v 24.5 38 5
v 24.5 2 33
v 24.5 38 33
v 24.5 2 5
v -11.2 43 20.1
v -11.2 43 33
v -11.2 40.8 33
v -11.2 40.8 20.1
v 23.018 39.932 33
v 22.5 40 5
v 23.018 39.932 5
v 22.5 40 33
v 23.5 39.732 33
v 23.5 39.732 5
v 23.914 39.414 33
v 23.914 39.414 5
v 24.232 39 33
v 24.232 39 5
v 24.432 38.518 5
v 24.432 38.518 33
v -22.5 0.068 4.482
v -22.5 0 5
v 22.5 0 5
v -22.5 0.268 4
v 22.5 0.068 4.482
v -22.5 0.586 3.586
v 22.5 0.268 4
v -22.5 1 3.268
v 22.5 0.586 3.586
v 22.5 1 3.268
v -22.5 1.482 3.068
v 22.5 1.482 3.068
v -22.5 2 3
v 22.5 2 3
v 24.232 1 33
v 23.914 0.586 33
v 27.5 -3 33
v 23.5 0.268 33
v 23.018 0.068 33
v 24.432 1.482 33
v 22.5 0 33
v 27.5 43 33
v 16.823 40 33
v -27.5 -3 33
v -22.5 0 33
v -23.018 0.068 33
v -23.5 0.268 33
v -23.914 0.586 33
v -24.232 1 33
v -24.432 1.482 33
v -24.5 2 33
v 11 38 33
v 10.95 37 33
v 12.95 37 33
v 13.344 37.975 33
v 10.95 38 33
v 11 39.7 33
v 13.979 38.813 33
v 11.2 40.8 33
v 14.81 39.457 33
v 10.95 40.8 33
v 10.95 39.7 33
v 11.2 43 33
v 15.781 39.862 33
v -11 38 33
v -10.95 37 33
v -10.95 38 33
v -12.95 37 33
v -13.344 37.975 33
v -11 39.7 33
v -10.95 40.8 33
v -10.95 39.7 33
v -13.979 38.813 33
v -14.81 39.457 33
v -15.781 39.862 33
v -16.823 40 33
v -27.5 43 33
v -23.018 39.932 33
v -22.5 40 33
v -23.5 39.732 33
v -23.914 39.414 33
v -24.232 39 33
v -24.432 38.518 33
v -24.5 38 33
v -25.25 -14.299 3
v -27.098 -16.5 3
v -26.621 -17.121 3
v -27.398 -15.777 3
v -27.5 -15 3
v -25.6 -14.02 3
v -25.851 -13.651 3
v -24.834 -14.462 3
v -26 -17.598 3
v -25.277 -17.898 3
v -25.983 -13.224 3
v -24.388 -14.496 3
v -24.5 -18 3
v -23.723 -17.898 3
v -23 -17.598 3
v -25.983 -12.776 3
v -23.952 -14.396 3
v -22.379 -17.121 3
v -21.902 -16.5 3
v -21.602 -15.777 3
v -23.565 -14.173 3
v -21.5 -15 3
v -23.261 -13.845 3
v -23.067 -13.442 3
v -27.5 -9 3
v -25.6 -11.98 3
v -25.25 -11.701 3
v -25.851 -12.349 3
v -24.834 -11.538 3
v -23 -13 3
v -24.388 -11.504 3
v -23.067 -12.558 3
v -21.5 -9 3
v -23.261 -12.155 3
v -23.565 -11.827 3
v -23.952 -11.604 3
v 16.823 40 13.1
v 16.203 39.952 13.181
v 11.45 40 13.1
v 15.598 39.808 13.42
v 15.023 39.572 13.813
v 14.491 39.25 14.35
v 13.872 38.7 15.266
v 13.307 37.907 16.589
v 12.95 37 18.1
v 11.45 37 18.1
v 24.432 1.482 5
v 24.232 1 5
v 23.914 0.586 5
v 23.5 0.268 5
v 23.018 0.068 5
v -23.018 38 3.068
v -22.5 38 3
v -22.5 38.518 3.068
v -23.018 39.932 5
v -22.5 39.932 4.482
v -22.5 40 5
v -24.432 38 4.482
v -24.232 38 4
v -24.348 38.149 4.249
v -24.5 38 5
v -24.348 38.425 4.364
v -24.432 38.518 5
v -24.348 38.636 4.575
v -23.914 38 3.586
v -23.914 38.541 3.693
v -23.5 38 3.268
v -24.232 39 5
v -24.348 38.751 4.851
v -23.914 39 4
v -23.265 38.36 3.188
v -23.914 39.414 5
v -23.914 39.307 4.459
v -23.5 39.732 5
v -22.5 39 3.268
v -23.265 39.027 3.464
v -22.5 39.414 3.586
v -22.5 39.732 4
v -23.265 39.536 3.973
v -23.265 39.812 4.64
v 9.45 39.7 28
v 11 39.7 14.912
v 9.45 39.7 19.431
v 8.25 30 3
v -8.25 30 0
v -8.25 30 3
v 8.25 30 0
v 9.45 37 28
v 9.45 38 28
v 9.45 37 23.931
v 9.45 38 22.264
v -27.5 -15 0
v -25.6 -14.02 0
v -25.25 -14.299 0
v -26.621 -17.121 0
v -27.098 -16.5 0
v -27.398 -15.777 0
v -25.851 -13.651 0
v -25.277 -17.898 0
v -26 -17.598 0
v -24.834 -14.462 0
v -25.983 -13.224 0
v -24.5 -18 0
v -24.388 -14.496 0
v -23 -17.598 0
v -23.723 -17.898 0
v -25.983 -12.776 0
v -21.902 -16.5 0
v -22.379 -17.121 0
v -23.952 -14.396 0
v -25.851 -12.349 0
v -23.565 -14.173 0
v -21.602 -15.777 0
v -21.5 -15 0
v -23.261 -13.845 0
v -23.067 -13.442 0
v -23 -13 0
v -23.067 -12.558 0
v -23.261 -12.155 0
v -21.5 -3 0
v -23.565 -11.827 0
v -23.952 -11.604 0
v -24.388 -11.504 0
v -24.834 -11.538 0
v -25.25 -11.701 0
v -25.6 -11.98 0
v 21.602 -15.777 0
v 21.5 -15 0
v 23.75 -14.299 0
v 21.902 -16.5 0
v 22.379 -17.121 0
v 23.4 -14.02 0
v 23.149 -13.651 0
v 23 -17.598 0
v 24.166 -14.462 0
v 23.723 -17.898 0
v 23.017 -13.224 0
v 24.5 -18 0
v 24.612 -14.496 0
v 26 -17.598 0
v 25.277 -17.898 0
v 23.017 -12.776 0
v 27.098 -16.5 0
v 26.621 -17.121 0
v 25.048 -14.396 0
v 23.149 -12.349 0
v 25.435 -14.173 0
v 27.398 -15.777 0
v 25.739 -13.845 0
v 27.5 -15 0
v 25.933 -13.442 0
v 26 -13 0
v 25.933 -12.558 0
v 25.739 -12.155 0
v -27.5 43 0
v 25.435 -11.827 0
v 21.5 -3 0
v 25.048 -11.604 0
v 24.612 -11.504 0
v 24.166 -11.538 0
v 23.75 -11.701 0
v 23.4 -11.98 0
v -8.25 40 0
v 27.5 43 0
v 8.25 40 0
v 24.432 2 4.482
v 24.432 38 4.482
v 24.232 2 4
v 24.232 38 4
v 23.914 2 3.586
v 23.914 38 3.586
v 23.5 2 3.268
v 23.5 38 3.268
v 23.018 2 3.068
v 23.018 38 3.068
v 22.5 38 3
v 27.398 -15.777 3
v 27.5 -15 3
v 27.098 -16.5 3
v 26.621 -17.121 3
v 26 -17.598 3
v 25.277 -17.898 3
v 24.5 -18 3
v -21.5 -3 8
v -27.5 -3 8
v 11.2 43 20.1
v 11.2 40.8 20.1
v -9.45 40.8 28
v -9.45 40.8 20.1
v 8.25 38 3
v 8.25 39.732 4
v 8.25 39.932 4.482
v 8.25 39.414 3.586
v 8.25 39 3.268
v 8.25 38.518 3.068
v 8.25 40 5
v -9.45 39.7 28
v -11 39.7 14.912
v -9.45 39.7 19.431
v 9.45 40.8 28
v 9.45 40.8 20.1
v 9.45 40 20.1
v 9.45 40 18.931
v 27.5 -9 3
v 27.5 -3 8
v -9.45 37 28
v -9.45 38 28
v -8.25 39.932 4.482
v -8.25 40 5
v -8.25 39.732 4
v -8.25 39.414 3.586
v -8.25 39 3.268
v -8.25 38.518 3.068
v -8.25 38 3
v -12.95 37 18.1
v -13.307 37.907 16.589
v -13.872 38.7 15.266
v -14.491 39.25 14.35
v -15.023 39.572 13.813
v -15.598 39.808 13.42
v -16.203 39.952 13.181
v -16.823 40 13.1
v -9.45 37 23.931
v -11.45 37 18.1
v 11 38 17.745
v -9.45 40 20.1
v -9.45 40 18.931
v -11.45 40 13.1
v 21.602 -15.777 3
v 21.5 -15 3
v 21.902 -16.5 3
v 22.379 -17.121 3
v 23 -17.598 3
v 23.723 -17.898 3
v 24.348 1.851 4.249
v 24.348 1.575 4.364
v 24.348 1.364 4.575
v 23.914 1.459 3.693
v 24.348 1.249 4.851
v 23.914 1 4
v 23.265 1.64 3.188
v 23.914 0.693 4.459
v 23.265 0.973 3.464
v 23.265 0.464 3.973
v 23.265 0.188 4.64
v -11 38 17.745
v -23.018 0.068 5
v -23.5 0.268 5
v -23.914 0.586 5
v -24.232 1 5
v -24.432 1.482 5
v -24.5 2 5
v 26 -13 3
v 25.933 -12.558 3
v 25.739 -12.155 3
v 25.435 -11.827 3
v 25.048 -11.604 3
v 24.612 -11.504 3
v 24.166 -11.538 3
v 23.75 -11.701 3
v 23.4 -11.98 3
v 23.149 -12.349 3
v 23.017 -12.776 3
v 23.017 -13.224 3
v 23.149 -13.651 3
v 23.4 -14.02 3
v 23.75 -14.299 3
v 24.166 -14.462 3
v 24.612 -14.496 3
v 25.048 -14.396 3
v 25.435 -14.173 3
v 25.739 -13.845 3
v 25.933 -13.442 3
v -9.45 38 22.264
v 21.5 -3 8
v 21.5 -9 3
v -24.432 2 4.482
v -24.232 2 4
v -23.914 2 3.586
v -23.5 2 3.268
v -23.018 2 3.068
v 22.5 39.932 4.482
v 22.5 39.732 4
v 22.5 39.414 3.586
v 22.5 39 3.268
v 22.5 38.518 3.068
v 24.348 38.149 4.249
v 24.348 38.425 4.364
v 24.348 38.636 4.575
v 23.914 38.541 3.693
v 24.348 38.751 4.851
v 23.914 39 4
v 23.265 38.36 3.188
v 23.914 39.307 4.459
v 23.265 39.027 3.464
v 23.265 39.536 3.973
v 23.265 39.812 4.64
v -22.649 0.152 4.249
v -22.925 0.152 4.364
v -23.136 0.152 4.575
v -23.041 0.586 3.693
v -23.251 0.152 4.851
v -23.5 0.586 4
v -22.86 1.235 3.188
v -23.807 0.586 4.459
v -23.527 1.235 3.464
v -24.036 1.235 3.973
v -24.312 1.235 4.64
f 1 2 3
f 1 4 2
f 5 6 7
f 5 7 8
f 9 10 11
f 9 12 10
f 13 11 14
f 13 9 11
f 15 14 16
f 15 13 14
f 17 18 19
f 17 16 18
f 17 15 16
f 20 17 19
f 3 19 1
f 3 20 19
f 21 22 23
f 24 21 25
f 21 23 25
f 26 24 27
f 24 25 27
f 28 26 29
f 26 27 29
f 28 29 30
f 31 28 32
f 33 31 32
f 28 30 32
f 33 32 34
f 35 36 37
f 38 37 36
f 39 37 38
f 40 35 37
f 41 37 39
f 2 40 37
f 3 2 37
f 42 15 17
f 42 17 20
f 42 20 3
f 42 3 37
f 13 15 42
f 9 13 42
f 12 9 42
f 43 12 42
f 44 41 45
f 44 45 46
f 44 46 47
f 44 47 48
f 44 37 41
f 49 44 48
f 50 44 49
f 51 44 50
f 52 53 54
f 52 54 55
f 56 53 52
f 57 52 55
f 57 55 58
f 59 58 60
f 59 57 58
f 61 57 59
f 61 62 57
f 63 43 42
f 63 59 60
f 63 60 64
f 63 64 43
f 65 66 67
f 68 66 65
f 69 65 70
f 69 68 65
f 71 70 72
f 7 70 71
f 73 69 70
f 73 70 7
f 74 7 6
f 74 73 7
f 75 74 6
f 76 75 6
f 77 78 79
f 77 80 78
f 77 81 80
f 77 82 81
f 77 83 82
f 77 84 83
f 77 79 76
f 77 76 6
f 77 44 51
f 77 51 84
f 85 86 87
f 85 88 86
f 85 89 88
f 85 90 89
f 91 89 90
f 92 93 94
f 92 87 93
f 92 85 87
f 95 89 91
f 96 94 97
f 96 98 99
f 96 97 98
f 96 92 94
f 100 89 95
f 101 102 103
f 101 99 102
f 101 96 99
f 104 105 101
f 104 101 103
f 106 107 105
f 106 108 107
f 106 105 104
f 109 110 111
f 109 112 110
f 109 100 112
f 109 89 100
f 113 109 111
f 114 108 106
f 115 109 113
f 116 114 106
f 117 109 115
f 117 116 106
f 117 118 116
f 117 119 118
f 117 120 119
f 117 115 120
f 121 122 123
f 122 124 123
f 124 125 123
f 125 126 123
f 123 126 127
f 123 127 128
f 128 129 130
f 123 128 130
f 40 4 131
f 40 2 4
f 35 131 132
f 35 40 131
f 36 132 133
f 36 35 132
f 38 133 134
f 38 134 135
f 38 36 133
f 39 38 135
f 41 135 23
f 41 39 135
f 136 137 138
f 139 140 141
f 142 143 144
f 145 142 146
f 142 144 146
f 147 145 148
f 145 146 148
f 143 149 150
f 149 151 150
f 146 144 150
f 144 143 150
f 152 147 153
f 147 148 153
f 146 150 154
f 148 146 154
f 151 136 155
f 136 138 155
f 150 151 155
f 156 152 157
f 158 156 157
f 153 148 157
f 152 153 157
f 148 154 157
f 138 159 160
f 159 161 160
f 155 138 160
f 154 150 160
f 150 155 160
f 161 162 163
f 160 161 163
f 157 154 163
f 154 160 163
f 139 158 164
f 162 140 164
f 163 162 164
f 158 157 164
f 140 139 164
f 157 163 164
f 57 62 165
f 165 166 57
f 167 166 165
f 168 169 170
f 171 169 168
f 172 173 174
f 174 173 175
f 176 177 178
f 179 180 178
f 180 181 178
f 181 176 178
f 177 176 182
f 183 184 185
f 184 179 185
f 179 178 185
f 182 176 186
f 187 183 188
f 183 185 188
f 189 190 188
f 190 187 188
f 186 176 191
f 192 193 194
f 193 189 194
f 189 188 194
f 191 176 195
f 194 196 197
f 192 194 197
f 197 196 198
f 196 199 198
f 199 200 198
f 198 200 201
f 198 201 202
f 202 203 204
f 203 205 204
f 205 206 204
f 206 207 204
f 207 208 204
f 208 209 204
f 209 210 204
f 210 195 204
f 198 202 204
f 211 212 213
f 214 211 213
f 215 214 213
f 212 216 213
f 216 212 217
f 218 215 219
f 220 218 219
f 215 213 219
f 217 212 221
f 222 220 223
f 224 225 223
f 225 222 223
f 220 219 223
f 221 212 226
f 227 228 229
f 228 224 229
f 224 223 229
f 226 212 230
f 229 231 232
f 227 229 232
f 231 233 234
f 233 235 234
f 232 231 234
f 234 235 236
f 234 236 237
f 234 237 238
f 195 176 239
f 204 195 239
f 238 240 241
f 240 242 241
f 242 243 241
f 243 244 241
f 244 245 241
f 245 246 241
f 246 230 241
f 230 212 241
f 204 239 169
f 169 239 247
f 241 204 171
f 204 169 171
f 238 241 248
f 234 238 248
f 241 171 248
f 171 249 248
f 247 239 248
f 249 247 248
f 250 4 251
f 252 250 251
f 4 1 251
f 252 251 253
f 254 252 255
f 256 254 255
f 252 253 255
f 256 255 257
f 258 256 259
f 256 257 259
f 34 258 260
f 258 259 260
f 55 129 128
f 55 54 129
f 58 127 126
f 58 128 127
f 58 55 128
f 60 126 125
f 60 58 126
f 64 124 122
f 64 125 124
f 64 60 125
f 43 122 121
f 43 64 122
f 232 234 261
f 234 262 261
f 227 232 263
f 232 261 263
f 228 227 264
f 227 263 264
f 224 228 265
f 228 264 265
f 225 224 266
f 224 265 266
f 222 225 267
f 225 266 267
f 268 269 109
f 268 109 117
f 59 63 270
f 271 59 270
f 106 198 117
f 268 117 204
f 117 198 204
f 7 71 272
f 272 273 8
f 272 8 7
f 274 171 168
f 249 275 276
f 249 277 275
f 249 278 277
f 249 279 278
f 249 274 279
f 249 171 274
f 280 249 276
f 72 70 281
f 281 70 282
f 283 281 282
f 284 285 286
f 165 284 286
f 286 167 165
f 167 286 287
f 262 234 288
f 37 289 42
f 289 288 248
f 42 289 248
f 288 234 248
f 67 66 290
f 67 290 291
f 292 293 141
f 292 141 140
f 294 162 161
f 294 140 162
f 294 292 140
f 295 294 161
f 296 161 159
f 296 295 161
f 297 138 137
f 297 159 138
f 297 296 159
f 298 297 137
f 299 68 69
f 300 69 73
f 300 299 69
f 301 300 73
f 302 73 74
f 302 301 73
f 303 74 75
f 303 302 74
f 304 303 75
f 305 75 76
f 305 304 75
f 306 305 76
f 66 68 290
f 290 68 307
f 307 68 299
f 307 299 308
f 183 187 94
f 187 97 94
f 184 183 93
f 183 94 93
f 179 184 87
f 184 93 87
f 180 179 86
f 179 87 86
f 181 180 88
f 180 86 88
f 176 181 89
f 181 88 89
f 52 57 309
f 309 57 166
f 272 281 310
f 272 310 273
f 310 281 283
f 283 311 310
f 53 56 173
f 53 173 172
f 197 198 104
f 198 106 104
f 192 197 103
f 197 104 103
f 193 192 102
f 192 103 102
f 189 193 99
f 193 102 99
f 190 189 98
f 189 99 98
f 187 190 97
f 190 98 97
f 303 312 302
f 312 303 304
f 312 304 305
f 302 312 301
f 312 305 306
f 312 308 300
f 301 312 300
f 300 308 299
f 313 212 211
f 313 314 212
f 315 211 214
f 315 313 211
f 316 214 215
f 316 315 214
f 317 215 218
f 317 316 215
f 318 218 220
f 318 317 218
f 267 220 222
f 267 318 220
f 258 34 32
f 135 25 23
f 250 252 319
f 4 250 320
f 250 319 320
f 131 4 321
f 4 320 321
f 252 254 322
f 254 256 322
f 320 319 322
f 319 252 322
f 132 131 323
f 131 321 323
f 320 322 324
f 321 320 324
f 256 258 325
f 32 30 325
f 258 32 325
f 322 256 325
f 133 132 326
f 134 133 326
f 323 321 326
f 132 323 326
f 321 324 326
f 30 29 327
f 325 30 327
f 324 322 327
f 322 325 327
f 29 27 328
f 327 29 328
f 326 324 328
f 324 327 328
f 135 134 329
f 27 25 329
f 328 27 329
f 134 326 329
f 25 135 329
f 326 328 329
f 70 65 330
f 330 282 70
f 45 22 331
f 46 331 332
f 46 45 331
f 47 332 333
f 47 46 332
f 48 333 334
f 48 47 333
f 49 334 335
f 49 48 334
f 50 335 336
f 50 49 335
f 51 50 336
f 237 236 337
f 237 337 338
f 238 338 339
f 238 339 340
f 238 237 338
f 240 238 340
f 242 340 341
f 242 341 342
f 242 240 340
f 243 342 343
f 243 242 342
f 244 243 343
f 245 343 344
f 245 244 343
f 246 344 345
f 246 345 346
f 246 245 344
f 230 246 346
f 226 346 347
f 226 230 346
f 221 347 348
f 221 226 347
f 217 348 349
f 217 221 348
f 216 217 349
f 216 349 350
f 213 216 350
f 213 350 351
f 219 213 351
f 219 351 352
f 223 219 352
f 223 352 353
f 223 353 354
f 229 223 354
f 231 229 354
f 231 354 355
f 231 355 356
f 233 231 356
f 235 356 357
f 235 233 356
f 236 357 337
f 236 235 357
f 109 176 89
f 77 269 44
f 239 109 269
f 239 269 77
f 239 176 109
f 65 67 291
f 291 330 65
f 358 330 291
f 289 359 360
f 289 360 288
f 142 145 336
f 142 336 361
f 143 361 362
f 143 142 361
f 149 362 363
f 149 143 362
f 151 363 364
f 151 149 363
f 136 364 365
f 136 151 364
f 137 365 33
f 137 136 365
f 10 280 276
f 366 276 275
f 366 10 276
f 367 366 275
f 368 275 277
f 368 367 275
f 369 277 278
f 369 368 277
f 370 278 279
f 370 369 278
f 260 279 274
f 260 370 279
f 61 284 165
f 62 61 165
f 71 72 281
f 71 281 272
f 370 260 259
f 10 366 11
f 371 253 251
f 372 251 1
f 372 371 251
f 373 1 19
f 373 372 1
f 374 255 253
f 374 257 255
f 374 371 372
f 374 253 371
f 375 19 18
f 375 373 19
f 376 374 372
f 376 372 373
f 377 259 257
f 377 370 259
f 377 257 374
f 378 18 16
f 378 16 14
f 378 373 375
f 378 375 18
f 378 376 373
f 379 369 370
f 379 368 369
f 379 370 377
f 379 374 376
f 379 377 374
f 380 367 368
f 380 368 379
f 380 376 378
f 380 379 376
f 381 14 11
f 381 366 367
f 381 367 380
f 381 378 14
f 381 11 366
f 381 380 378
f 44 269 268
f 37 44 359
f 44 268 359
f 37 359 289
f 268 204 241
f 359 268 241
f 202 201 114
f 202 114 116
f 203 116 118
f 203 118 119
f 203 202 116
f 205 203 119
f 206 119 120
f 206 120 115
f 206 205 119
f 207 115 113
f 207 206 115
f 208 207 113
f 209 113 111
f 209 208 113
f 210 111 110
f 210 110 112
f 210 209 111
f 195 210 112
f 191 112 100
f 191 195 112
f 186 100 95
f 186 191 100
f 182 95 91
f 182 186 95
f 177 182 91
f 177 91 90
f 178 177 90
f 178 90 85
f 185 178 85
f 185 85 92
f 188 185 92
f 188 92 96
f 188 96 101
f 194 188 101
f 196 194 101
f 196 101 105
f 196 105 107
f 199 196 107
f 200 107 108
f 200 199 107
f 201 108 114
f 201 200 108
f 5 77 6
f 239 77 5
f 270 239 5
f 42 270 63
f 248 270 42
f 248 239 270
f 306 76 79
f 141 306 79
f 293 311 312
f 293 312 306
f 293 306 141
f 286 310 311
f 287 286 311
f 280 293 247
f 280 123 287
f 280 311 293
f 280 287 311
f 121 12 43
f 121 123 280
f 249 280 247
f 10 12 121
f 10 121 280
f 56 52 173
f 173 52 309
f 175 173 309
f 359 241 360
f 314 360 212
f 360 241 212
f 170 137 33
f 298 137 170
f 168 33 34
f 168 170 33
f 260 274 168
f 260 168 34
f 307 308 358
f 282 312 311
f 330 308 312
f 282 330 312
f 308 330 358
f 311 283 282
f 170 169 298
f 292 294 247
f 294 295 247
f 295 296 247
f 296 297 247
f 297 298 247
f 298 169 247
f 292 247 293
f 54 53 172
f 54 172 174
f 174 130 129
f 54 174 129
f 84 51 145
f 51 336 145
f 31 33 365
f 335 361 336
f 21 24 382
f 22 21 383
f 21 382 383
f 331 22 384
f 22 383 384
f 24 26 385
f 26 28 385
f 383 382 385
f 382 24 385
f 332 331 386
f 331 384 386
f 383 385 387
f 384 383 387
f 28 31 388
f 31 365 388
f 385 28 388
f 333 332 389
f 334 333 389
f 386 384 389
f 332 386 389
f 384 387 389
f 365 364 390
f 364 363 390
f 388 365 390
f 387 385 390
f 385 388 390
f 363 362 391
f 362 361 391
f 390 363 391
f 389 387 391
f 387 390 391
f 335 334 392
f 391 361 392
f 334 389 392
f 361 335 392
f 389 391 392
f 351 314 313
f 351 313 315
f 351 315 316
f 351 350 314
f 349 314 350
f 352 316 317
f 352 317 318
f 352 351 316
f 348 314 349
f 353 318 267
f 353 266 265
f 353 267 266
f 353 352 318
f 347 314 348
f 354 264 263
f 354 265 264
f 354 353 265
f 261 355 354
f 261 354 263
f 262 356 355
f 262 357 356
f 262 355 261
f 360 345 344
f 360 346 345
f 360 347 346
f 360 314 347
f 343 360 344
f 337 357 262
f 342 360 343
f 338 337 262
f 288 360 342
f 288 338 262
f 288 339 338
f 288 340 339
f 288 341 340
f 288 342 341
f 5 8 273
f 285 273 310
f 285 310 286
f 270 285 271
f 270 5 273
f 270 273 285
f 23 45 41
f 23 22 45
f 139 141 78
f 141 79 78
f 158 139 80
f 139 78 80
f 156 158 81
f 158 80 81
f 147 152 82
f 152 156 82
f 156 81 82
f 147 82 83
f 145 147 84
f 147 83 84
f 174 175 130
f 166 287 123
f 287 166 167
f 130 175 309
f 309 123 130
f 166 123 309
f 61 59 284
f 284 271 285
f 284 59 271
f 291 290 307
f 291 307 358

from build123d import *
from OCP.BRepFilletAPI import BRepFilletAPI_MakeChamfer

# Parameters (mm, degrees)
SKETCH_1_R           = 1.5
SKETCH_1_W           = 16.5
SKETCH_1_H           = 10
EXTRUDE_1_DEPTH      = 3
SKETCH_2_W           = 55
SKETCH_2_H           = 46
SKETCH_2_W_2         = 49
SKETCH_2_H_2         = 40
EXTRUDE_2_DEPTH      = 30
SKETCH_3_W           = 22.4
SKETCH_3_H           = 13.1
CUT_EXTRUDE_1_DEPTH  = 40
EXTRUDE_3_DEPTH      = 12.9
EXTRUDE_3_DEPTH_BACK = 2
FILLET_1_R           = 4
CHAMFER_1_SIZE       = 1.5
CHAMFER_1_SIZE2      = 5
CHAMFER_2_SIZE       = 5
CHAMFER_2_SIZE2      = 1.5
CHAMFER_3_SIZE       = 5
CHAMFER_3_SIZE_2     = 3
CHAMFER_6_SIZE       = 6
CHAMFER_6_SIZE2      = 5
FILLET_2_R           = 3
FILLET_3_R           = 2


# Some blends are built 0.0001 mm under size
with BuildPart() as part:
    # Эскиз1 → Бобышка-Вытянуть1 (new body)
    with BuildSketch(Plane.XY):
        Polygon((27.5, 43), (-27.5, 43), (-27.5, -3), (-27.5, -18), (-21.5, -18), (-21.5, -3), (21.5, -3), (21.5, -18), (27.5, -18), (27.5, -3), align=None)
        with Locations((-24.5, -13)):
            Circle(SKETCH_1_R, mode=Mode.SUBTRACT)
        with Locations((24.5, -13)):
            Circle(SKETCH_1_R, mode=Mode.SUBTRACT)
        with Locations((0, 35)):
            Rectangle(SKETCH_1_W, SKETCH_1_H, mode=Mode.SUBTRACT)
    extrude(amount=EXTRUDE_1_DEPTH)

    # Эскиз2 → Бобышка-Вытянуть2 (add)
    with BuildSketch(Plane.XY.offset(3)):
        with Locations((0, 20)):
            Rectangle(SKETCH_2_W, SKETCH_2_H)
        with Locations((0, 20)):
            Rectangle(SKETCH_2_W_2, SKETCH_2_H_2, mode=Mode.SUBTRACT)
    extrude(amount=EXTRUDE_2_DEPTH)

    # Эскиз3 → Вырез-Вытянуть1 (cut)
    with BuildSketch(Plane(origin=(0, 43, 0), x_dir=(1, 0, 0), z_dir=(0, 1, 0))):
        with Locations((0, -26.65)):
            Rectangle(SKETCH_3_W, SKETCH_3_H)
    extrude(amount=-CUT_EXTRUDE_1_DEPTH, mode=Mode.SUBTRACT)

    # Эскиз4 → Бобышка-Вытянуть3 (add, two sides: drawn at the far end of the back side and taken through both)
    with BuildSketch(Plane.XY.offset(20.1).offset(-EXTRUDE_3_DEPTH_BACK)):
        Polygon((11.2, 40), (11.2, 40.8), (11, 40.8), (9.45, 40.8), (9.45, 40), align=None)
        Polygon((11.2, 40), (9.45, 40), (9.45, 39.7), (11, 39.7), (11, 38), (9.45, 38), (9.45, 37), (12.95, 37), (12.95, 40), align=None)
        Polygon((-11.2, 40), (-9.45, 40), (-9.45, 40.8), (-11, 40.8), (-11.2, 40.8), align=None)
        Polygon((-9.45, 39.7), (-9.45, 40), (-11.2, 40), (-12.95, 40), (-12.95, 37), (-9.45, 37), (-9.45, 38), (-11, 38), (-11, 39.7), align=None)
    extrude(amount=EXTRUDE_3_DEPTH + EXTRUDE_3_DEPTH_BACK)

    # Скругление1
    # the kernel refuses this fillet: 4 mm, written as the material it adds along each edge
    with BuildSketch(Plane(origin=(-12.95, 40, 18.1), x_dir=(-1, 0, 0), z_dir=(0, 0, 1))) as fillet_1_piece_1:
        with BuildLine():
            CenterArc((3.872983346, 4), FILLET_1_R, 194.477512186, 75.522487814)
            Line((0, 3), (-0.077459667, 2.98))
            ThreePointArc((-0.077459667, 2.98), (-0.08, 1.5), (-0.08, 0))
            Line((-0.08, 0), (0, -0.08))
            Line((0, -0.08), (3.872983346, -0.08))
            Line((3.872983346, -0.08), (3.872983346, 0))
        make_face()
    extrude(amount=14.9)
    with BuildSketch(Plane(origin=(12.95, 40, 33), x_dir=(0, -1, 0), z_dir=(0, 0, -1))) as fillet_1_piece_2:
        with BuildLine():
            CenterArc((4, -3.872983346), FILLET_1_R, 104.477512186, 75.522487814)
            Line((0, -3.872983346), (-0.08, -3.872983346))
            Line((-0.08, -3.872983346), (-0.08, 0))
            Line((-0.08, 0), (0, 0.08))
            ThreePointArc((0, 0.08), (1.5, 0.08), (2.98, 0.077459667))
            Line((2.98, 0.077459667), (3, 0))
        make_face()
    extrude(amount=14.9)

    # Фаска1
    chamfer_1_edges = [part.edges().sort_by_distance(p)[0] for p in [
        (9.45, 37.5, 33),
        (-9.45, 40.25, 33),
        (-9.45, 37.5, 33),
    ]]
    chamfer_1_side = [part.faces().sort_by_distance(p)[0] for p in [
        (13.93441787, 39.729121995, 33),
    ]]
    chamfer(chamfer_1_edges, length=CHAMFER_1_SIZE, length2=CHAMFER_1_SIZE2, reference=chamfer_1_side[0])

    # Фаска2
    chamfer_2_edges = [part.edges().sort_by_distance(p)[0] for p in [
        (9.45, 40.25, 33),
    ]]
    chamfer_2_side = [part.faces().sort_by_distance(p)[0] for p in [
        (9.45, 40.233772819, 26.247768763),
    ]]
    chamfer(chamfer_2_edges, length=CHAMFER_2_SIZE, length2=CHAMFER_2_SIZE2, reference=chamfer_2_side[0])

    # Фаска3
    chamfer_3_edges_1 = [part.edges().sort_by_distance(p)[0] for p in [
        (13.136491673, 40, 18.1),
    ]]
    chamfer_3_side_1 = [part.faces().sort_by_distance(p)[0] for p in [
        (13.136491673, 40, 18.04),
    ]]
    chamfer_3_edges_2 = [part.edges().sort_by_distance(p)[0] for p in [
        (-13.136491673, 40, 18.1),
    ]]
    chamfer_3_side_2 = [part.faces().sort_by_distance(p)[0] for p in [
        (-13.136491673, 40, 18.04),
    ]]
    chamfer_3 = BRepFilletAPI_MakeChamfer(part.part.solid().wrapped)
    for e in chamfer_3_edges_1:
        chamfer_3.Add(CHAMFER_3_SIZE - 0.0001, CHAMFER_3_SIZE_2 - 0.0001, e.wrapped, chamfer_3_side_1[0].wrapped)
    for e in chamfer_3_edges_2:
        chamfer_3.Add(CHAMFER_3_SIZE - 0.0001, CHAMFER_3_SIZE_2 - 0.0001, e.wrapped, chamfer_3_side_2[0].wrapped)
    add(Compound.cast(chamfer_3.Shape()), mode=Mode.REPLACE)  # a hair under: the kernel refuses the full size

    # Фаска5
    # the kernel refuses this chamfer: 3, 2 mm, written as the material it takes off along each edge
    with BuildSketch(Plane(origin=(9.45, 41.988024108, 9.786682308), x_dir=(0, 0.8574959522145404, 0.514490711223904), z_dir=(0, -0.514490711223904, 0.8574959522145406))) as chamfer_5_piece_1_section:
        with BuildLine():
            Line((3.099846035, 0.066564024), (-0.099846035, -2.066564024))
            Line((-0.099846035, -2.066564024), (-0.159846035, -2.066564024))
            ThreePointArc((-0.159846035, -2.066564024), (-0.06, -1.033282012), (-0.06, 0))
            Line((-0.06, 0), (0, 0.06))
            ThreePointArc((0, 0.06), (1.549923018, 0.06), (3.099846035, 0.126564024))
            Line((3.099846035, 0.126564024), (3.099846035, 0.066564024))
        make_face()
    chamfer_5_piece_1 = extrude(amount=17.446278464, mode=Mode.PRIVATE)
    chamfer_5_piece_1 = split(chamfer_5_piece_1, bisect_by=Plane(origin=(9.45, 40, 9.786682308), z_dir=(0, -1, 0)), keep=Keep.TOP, mode=Mode.PRIVATE)
    add(chamfer_5_piece_1, mode=Mode.SUBTRACT)
    with BuildSketch(Plane(origin=(-9.45, 41.988024108, 9.786682308), x_dir=(-1, 0, 0), z_dir=(0, -0.514490711223904, 0.8574959522145406))) as chamfer_5_piece_2_section:
        with BuildLine():
            Line((2.066564024, 0.099846035), (-0.066564024, -3.099846035))
            Line((-0.066564024, -3.099846035), (-0.126564024, -3.099846035))
            ThreePointArc((-0.126564024, -3.099846035), (-0.06, -1.549923018), (-0.06, 0))
            Line((-0.06, 0), (0, 0.06))
            ThreePointArc((0, 0.06), (1.033282012, 0.06), (2.066564024, 0.159846035))
            Line((2.066564024, 0.159846035), (2.066564024, 0.099846035))
        make_face()
    chamfer_5_piece_2 = extrude(amount=17.446278464, mode=Mode.PRIVATE)
    chamfer_5_piece_2 = split(chamfer_5_piece_2, bisect_by=Plane(origin=(-9.45, 40, 9.786682308), z_dir=(0, -1, 0)), keep=Keep.TOP, mode=Mode.PRIVATE)
    add(chamfer_5_piece_2, mode=Mode.SUBTRACT)

    # Фаска6: one chamfer whose edges measure the first distance from different faces: ONE call of the kernel's chamfer builder (chamfer() names one face for all edges)
    chamfer_6_edges_1 = [part.edges().sort_by_distance(p)[0] for p in [
        (24.5, -3, 3),
    ]]
    chamfer_6_side_1 = [part.faces().sort_by_distance(p)[0] for p in [
        (24.5, -10.286914786, 3),
    ]]
    chamfer_6_edges_2 = [part.edges().sort_by_distance(p)[0] for p in [
        (-24.5, -3, 3),
    ]]
    chamfer_6_side_2 = [part.faces().sort_by_distance(p)[0] for p in [
        (-24.5, -10.286914786, 3),
    ]]
    chamfer_6 = BRepFilletAPI_MakeChamfer(part.part.solid().wrapped)
    for e in chamfer_6_edges_1:
        chamfer_6.Add(CHAMFER_6_SIZE, CHAMFER_6_SIZE2, e.wrapped, chamfer_6_side_1[0].wrapped)  # the first distance lies on this face
    for e in chamfer_6_edges_2:
        chamfer_6.Add(CHAMFER_6_SIZE, CHAMFER_6_SIZE2, e.wrapped, chamfer_6_side_2[0].wrapped)  # the first distance lies on this face
    add(Compound.cast(chamfer_6.Shape()), mode=Mode.REPLACE)

    # Скругление2
    fillet_2_edges = [part.edges().sort_by_distance(p)[0] for p in [
        (27.5, -18, 1.5),
        (21.5, -18, 1.5),
        (-21.5, -18, 1.5),
        (-27.5, -18, 1.5),
    ]]
    fillet(fillet_2_edges, radius=FILLET_2_R - 0.0001)  # a hair under: the kernel refuses the full size

    # Скругление3
    fillet_3_edges = [part.edges().sort_by_distance(p)[0] for p in [
        (-16.375, 40, 3),
        (16.375, 40, 3),
        (-24.5, 20, 3),
        (0, 0, 3),
        (24.5, 20, 3),
        (-24.5, 0, 18),
        (24.5, 0, 18),
        (24.5, 40, 18),
        (-24.5, 40, 18),
    ]]
    fillet(fillet_3_edges, radius=FILLET_3_R)


solid = part.part
